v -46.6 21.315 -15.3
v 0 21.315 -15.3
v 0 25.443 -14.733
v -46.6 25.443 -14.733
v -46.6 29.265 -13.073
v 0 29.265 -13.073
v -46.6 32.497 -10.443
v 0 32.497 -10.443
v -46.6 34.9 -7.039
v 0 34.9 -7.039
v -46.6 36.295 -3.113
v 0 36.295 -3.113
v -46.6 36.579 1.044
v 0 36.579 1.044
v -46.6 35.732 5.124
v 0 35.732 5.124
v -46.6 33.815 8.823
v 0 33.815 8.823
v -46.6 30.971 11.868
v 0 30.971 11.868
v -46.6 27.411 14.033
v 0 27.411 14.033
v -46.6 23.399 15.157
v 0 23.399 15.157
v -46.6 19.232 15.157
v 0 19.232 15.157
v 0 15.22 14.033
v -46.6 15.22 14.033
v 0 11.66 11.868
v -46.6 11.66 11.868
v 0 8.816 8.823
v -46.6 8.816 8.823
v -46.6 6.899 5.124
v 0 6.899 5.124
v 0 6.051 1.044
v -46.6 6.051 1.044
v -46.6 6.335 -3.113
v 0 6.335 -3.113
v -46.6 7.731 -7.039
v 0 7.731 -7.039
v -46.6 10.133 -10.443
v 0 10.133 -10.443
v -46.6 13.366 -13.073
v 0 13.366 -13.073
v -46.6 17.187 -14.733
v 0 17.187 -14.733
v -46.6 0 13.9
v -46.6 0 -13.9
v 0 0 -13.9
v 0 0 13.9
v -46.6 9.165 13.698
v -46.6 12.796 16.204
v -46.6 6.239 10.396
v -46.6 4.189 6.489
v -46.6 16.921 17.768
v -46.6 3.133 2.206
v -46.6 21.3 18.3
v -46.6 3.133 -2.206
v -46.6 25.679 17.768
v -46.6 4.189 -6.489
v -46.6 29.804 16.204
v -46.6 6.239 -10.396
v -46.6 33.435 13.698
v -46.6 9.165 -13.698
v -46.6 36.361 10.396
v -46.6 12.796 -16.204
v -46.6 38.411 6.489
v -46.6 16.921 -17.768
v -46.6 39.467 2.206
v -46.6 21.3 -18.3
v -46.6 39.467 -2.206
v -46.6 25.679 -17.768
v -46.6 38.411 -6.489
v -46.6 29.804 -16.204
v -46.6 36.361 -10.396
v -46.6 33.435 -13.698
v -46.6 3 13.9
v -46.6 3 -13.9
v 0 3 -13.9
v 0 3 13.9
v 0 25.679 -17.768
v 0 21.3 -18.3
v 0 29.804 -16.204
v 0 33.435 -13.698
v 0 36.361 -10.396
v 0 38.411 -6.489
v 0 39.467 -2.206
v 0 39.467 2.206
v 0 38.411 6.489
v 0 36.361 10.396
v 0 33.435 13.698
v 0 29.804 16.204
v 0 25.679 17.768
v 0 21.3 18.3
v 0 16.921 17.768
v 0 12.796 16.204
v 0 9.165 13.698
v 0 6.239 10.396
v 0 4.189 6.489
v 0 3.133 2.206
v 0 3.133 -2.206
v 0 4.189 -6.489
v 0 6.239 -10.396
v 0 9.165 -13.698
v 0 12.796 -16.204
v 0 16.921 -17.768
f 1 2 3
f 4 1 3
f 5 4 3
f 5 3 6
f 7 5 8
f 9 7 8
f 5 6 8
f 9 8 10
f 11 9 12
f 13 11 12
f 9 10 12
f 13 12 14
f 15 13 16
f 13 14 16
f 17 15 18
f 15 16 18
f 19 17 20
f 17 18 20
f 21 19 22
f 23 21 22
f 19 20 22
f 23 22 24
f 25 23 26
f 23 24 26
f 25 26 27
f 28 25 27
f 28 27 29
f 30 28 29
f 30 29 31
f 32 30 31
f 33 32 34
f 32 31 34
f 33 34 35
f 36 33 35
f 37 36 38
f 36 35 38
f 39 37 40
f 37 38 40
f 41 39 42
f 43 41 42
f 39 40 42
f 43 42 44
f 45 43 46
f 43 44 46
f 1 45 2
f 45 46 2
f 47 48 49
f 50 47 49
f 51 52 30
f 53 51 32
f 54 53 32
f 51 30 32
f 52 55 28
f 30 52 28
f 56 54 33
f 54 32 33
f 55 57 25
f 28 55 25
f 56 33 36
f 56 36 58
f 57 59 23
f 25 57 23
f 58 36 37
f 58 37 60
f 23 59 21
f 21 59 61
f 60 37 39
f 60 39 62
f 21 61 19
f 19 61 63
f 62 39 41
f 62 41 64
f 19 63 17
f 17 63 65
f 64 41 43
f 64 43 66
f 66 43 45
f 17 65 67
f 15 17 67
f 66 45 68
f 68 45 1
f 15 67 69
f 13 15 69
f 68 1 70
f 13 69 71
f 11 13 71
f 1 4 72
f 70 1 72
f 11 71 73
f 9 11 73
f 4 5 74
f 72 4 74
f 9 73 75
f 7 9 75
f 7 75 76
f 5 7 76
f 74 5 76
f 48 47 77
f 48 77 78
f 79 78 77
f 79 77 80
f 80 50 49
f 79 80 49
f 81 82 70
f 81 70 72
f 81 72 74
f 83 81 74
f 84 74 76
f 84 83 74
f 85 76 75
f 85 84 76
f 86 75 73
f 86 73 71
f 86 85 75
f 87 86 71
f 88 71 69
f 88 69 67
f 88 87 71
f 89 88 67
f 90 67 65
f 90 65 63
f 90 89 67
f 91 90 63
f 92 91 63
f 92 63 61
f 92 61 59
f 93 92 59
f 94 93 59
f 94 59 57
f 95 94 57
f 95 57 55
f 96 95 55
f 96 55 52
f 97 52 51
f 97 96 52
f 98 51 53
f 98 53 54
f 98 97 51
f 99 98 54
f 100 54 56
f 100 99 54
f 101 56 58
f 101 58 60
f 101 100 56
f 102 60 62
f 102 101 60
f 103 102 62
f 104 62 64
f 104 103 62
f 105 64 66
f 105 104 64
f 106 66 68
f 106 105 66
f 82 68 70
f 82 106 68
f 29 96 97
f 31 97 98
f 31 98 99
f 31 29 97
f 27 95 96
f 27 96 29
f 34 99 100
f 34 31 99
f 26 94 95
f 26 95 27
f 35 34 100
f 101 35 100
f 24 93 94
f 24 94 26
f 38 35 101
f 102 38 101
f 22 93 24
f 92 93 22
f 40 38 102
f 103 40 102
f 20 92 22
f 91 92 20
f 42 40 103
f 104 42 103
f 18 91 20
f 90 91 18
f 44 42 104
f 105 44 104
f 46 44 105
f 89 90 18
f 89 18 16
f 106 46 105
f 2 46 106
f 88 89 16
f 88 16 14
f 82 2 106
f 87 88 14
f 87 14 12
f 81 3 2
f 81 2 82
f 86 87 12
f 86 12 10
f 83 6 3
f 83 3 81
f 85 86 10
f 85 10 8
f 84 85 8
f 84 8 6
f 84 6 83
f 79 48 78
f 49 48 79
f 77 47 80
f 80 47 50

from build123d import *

# Parameters (mm, degrees)
SKETCH1_W           = 46.6
SKETCH1_H           = 27.8
BOSS_EXTRUDE1_DEPTH = 3
SKETCH3_R           = 18.3
BOSS_EXTRUDE2_DEPTH = 46.6
SKETCH4_R           = 15.3
CUT_EXTRUDE1_DEPTH  = 46.6


with BuildPart() as part:
    # Sketch1 → Boss-Extrude1 (new body)
    with BuildSketch(Plane(origin=(0, 0, 0), x_dir=(1, 0, 0), z_dir=(0, 1, 0))):
        with Locations((-23.300002726, -6.551e-06)):
            Rectangle(SKETCH1_W, SKETCH1_H)
    extrude(amount=BOSS_EXTRUDE1_DEPTH)


with BuildPart() as body_2:
    # Sketch3 → Boss-Extrude2 (new body)
    with BuildSketch(Plane(origin=(0, 0, 0), x_dir=(0, 0, -1), z_dir=(1, 0, 0))):
        with Locations((-6.551e-06, 21.3)):
            Circle(SKETCH3_R)
    extrude(amount=-BOSS_EXTRUDE2_DEPTH)

    # Sketch4 → Cut-Extrude1 (cut)
    with BuildSketch(Plane(origin=(0, 0, 0), x_dir=(0, 0, -1), z_dir=(1, 0, 0))):
        with Locations((0, 21.31516417)):
            Circle(SKETCH4_R)
    extrude(amount=-CUT_EXTRUDE1_DEPTH, mode=Mode.SUBTRACT)


solid = Compound([part.part, body_2.part])
